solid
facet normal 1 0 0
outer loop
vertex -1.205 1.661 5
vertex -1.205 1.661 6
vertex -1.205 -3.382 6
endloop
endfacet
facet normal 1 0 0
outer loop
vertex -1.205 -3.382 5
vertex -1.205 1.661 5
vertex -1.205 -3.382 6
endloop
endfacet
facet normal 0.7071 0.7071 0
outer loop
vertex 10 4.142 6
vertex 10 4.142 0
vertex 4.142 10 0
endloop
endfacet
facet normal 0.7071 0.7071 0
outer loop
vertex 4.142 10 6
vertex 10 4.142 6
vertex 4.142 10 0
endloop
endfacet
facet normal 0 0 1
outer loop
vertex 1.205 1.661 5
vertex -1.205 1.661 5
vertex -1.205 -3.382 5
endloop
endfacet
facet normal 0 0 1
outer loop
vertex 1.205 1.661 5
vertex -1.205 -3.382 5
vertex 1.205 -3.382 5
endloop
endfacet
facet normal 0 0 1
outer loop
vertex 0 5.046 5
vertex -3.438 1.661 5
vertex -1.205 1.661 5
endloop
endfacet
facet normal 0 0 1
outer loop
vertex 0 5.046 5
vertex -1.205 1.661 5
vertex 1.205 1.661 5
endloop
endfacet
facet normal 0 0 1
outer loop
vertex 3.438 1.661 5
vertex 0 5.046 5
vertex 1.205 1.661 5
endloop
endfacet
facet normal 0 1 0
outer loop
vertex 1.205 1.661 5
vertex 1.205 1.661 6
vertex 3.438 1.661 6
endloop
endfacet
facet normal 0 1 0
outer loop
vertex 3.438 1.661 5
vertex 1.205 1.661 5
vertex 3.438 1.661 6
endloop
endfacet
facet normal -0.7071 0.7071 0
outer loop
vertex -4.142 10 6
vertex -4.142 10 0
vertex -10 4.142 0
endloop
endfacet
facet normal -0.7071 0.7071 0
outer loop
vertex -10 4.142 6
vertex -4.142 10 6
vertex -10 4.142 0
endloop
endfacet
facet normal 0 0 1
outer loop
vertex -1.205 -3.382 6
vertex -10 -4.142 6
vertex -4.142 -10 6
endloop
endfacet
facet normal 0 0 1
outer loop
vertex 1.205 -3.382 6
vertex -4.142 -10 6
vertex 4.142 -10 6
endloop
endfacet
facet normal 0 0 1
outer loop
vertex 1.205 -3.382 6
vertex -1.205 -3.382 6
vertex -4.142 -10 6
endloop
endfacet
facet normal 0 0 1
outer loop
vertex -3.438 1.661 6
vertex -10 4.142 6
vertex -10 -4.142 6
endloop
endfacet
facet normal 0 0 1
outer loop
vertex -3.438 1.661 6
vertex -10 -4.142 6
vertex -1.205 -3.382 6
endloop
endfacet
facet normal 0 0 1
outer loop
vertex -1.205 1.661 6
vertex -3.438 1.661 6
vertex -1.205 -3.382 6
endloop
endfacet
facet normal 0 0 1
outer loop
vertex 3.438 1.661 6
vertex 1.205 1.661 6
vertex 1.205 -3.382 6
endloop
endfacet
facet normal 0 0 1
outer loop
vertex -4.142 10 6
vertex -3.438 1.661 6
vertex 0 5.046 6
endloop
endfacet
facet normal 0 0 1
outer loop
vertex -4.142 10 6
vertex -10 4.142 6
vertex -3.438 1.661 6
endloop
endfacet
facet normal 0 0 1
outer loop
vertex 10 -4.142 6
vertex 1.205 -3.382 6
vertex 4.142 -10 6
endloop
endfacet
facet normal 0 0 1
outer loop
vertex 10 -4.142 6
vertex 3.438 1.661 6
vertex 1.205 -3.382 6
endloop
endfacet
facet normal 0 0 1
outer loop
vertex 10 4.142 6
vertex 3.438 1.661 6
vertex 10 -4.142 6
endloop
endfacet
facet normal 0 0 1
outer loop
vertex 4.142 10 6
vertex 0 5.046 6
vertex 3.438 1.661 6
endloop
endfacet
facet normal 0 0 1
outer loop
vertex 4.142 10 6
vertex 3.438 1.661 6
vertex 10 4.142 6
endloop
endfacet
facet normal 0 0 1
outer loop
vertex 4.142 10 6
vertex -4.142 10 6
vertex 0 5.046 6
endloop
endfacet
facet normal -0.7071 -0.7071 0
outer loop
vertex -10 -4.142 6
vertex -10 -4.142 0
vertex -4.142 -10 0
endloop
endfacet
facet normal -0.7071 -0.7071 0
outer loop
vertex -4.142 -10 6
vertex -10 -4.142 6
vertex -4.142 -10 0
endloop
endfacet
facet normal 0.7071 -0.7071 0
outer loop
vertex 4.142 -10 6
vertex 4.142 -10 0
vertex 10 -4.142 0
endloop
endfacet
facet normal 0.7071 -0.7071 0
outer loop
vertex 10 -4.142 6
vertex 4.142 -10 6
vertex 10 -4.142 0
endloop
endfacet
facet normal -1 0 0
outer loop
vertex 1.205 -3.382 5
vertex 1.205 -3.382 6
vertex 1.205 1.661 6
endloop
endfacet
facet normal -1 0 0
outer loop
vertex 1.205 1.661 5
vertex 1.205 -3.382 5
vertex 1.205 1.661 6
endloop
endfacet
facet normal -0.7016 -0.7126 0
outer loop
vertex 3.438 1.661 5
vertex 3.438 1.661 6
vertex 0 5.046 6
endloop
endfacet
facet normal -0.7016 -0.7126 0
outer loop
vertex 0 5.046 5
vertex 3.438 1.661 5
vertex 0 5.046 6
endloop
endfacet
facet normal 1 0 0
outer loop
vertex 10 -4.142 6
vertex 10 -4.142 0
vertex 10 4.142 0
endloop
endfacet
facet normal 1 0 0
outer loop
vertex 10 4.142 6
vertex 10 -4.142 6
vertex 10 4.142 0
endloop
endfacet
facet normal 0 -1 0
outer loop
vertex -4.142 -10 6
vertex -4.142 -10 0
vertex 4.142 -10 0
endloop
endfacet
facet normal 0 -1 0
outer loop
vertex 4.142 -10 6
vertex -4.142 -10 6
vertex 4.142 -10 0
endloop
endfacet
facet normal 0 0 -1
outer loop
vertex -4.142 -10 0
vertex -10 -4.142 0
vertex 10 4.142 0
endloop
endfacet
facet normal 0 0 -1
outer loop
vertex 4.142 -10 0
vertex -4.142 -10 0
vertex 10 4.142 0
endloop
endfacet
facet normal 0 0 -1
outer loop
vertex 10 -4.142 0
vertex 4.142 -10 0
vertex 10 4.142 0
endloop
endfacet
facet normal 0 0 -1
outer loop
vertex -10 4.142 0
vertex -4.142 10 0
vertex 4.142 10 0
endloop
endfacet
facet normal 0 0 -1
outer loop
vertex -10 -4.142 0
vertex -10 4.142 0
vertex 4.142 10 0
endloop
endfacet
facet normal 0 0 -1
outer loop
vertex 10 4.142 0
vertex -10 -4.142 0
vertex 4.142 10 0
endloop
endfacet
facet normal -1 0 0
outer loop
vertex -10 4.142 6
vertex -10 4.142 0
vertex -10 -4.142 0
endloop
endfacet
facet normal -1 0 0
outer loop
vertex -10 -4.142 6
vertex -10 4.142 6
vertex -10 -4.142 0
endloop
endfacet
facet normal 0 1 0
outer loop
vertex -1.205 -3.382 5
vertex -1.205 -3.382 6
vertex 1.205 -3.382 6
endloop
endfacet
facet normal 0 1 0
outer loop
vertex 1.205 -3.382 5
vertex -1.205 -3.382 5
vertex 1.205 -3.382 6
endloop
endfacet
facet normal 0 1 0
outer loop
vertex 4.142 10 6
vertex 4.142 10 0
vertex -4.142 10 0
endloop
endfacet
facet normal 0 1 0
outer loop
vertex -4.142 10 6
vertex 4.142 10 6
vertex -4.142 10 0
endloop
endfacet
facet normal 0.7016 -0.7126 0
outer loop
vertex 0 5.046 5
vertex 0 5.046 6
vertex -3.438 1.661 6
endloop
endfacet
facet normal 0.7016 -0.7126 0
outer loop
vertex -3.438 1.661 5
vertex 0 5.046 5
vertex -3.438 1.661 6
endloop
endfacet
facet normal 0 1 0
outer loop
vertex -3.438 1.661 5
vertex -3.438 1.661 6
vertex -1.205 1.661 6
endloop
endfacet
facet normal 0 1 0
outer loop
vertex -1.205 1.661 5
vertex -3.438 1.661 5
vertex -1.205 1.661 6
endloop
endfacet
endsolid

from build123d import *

# Parameters (mm, degrees)
F1_DEPTH = 6
F3_DEPTH = 1


with BuildPart() as f1:
    # F0 (on Top) → F1 (new body)
    with BuildSketch(Plane.XY):
        Polygon((10, -4.142136), (10, 4.142136), (4.142136, 10), (-4.142136, 10), (-10, 4.142136), (-10, -4.142136), (-4.142136, -10), (4.142136, -10), align=None)
    extrude(amount=F1_DEPTH)

    # F2 (on face) → F3 (cut)
    with BuildSketch(Plane.XY.offset(6)):
        Polygon((3.437641, 1.660818), (0, 5.046416), (-3.437641, 1.660818), (-1.204587, 1.660818), (-1.204587, -3.381562), (0, -3.381562), (1.204587, -3.381562), (1.204587, 1.660818), align=None)
    extrude(amount=-F3_DEPTH, mode=Mode.SUBTRACT)


solid = f1.part
